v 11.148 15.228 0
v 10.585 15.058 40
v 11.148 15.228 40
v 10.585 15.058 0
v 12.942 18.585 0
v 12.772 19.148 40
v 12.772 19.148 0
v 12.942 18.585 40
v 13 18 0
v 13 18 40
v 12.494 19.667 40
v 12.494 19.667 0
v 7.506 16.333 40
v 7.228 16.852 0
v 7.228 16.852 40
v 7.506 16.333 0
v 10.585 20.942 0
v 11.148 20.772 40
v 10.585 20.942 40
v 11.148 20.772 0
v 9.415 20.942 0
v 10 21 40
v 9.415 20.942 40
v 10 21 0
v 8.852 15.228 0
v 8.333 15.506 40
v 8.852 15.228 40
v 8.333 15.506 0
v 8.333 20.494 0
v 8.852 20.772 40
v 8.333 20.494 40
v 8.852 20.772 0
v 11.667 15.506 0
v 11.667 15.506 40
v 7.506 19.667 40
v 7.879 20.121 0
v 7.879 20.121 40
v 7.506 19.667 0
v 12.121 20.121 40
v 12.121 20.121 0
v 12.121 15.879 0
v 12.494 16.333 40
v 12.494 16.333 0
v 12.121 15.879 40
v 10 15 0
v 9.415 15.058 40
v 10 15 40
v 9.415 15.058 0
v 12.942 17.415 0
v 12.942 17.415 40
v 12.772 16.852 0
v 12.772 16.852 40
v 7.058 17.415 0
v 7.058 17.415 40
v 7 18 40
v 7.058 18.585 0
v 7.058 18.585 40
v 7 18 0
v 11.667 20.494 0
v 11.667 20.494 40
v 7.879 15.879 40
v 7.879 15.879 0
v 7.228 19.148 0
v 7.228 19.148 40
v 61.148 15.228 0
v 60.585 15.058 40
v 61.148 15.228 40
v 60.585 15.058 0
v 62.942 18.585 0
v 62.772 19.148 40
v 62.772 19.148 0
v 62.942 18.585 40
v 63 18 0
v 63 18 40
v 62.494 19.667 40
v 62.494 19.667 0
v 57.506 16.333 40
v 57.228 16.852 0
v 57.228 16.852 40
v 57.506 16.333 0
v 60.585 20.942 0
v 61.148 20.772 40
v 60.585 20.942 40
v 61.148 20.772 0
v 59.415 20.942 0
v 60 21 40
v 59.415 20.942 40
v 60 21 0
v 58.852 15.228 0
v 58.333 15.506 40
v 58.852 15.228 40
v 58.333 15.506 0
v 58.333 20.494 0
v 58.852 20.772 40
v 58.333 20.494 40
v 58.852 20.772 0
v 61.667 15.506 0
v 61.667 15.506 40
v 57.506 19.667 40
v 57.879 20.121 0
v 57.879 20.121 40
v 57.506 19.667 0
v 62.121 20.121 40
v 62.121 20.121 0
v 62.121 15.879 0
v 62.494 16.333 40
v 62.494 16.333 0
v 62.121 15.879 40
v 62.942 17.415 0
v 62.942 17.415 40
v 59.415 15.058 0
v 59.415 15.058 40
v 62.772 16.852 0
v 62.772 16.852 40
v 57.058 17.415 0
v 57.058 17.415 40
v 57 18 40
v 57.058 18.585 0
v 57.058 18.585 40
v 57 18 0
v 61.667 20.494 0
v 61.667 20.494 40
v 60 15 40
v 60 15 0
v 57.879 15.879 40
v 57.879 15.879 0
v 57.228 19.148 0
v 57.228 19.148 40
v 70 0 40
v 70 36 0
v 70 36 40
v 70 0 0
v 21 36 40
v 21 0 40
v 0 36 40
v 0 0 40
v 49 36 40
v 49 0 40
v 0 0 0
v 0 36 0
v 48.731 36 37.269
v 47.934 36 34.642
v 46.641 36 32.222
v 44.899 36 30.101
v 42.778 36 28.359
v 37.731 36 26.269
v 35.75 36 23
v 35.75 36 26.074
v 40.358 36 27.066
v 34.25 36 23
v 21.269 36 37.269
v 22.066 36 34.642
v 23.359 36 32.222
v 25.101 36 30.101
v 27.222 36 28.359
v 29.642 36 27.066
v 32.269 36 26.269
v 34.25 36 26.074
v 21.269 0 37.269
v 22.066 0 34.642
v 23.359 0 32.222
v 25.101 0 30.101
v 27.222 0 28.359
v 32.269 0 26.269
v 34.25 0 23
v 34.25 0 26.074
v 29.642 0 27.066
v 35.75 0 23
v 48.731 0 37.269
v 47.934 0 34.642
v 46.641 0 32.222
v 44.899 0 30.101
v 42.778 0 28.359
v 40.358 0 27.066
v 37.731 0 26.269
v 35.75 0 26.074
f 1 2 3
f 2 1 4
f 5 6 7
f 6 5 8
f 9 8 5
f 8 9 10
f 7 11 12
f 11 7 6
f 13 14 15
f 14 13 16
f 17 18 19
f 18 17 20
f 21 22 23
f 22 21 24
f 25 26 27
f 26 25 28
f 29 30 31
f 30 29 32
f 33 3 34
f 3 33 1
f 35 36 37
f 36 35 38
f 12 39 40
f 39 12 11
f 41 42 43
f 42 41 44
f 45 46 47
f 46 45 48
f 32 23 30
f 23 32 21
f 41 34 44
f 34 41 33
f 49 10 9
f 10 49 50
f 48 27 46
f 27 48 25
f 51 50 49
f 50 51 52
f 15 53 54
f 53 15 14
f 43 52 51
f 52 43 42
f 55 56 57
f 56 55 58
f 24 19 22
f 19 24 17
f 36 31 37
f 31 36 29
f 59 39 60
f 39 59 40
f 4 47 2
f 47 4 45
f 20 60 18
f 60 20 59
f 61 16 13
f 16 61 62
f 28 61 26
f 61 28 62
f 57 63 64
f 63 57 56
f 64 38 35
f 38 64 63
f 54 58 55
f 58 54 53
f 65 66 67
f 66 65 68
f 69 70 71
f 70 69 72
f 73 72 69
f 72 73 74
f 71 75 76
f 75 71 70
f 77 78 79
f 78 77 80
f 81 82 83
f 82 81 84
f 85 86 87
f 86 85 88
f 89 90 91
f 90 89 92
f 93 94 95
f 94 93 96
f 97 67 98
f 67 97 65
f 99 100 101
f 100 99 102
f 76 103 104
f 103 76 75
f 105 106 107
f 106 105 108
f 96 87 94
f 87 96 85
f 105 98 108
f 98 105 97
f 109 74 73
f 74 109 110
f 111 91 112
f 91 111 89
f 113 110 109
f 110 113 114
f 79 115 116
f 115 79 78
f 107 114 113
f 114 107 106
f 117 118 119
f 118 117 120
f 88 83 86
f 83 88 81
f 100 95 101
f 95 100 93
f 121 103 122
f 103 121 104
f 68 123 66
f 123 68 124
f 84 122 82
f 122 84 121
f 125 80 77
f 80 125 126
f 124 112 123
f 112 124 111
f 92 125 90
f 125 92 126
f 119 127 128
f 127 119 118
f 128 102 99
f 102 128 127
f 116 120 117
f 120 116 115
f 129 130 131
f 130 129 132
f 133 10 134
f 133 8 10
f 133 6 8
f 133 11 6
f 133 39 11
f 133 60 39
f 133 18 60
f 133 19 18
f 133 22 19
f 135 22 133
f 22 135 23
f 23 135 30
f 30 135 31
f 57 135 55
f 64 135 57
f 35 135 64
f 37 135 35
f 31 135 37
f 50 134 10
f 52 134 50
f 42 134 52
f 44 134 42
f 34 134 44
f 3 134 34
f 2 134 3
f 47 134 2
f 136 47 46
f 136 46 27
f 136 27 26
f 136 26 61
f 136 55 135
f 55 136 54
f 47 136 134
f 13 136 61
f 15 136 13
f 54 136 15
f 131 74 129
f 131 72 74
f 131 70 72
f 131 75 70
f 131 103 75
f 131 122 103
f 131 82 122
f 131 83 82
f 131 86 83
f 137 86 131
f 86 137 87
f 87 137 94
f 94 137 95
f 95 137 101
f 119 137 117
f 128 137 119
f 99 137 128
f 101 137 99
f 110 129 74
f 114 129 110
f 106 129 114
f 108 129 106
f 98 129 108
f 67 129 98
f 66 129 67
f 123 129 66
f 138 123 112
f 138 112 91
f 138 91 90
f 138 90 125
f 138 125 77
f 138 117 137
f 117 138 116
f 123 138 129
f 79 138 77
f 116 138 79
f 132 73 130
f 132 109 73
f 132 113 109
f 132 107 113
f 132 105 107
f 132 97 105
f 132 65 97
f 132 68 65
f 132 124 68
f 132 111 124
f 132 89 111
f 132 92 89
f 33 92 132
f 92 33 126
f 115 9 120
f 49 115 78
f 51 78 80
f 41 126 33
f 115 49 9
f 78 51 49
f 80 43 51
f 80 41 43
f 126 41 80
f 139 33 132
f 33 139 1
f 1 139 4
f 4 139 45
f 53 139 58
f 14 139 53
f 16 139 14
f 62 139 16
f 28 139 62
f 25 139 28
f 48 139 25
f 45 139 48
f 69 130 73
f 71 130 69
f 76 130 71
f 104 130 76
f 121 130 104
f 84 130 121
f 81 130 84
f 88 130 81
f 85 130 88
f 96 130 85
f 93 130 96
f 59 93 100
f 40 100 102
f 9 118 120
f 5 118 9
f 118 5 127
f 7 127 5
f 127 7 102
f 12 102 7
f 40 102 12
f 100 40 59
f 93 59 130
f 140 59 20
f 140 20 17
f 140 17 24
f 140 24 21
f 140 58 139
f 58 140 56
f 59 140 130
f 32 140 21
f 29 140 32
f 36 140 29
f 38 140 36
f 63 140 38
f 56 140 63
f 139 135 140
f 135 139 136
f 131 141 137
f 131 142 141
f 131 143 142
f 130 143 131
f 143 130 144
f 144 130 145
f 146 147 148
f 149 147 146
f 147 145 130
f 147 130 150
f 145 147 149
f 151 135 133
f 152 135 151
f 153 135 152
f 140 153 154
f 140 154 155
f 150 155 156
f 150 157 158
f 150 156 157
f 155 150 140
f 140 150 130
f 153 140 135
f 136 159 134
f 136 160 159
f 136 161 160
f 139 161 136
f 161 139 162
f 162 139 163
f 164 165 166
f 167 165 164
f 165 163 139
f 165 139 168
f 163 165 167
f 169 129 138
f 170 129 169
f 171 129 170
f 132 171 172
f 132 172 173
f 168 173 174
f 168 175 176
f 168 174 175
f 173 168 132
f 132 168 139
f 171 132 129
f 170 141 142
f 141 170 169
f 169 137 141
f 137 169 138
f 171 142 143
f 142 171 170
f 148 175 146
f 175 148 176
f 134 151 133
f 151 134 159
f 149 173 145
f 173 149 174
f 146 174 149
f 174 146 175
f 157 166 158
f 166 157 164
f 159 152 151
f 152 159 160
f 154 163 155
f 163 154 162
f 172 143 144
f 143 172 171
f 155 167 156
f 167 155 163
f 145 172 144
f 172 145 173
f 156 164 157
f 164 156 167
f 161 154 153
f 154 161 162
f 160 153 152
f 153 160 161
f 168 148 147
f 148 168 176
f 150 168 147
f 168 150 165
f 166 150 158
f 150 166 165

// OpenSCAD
$fn = 32;

// ----------------------------------------------------------------------
// Saddle clamp: split shaft clamp
// ----------------------------------------------------------------------

// --- parameters (mm) ---
blk_l = 70;               // block length, X
blk_w = 36;               // block width, Y
blk_h = 40;               // block height
clamp_r = 14;             // shaft groove radius
hole_r = 3;               // bolt hole radius
hole_m = 10;              // bolt hole margin from the ends
saw_w = 1.5;              // saw kerf width

saw_depth = clamp_r + 3;  // saw kerf depth

difference() {
  cube([blk_l, blk_w, blk_h]);
  translate([blk_l / 2, -1, blk_h])
    rotate([-90, 0, 0])
      cylinder(h = blk_w + 2, r = clamp_r);
  for (sx = [0, 1])
    translate([sx ? blk_l - hole_m : hole_m, blk_w / 2, -1])
      cylinder(r = hole_r, h = blk_h + 2);
  translate([blk_l / 2 - saw_w / 2, -1, blk_h - saw_depth])
    cube([saw_w, blk_w + 2, saw_depth + 1]);
}
